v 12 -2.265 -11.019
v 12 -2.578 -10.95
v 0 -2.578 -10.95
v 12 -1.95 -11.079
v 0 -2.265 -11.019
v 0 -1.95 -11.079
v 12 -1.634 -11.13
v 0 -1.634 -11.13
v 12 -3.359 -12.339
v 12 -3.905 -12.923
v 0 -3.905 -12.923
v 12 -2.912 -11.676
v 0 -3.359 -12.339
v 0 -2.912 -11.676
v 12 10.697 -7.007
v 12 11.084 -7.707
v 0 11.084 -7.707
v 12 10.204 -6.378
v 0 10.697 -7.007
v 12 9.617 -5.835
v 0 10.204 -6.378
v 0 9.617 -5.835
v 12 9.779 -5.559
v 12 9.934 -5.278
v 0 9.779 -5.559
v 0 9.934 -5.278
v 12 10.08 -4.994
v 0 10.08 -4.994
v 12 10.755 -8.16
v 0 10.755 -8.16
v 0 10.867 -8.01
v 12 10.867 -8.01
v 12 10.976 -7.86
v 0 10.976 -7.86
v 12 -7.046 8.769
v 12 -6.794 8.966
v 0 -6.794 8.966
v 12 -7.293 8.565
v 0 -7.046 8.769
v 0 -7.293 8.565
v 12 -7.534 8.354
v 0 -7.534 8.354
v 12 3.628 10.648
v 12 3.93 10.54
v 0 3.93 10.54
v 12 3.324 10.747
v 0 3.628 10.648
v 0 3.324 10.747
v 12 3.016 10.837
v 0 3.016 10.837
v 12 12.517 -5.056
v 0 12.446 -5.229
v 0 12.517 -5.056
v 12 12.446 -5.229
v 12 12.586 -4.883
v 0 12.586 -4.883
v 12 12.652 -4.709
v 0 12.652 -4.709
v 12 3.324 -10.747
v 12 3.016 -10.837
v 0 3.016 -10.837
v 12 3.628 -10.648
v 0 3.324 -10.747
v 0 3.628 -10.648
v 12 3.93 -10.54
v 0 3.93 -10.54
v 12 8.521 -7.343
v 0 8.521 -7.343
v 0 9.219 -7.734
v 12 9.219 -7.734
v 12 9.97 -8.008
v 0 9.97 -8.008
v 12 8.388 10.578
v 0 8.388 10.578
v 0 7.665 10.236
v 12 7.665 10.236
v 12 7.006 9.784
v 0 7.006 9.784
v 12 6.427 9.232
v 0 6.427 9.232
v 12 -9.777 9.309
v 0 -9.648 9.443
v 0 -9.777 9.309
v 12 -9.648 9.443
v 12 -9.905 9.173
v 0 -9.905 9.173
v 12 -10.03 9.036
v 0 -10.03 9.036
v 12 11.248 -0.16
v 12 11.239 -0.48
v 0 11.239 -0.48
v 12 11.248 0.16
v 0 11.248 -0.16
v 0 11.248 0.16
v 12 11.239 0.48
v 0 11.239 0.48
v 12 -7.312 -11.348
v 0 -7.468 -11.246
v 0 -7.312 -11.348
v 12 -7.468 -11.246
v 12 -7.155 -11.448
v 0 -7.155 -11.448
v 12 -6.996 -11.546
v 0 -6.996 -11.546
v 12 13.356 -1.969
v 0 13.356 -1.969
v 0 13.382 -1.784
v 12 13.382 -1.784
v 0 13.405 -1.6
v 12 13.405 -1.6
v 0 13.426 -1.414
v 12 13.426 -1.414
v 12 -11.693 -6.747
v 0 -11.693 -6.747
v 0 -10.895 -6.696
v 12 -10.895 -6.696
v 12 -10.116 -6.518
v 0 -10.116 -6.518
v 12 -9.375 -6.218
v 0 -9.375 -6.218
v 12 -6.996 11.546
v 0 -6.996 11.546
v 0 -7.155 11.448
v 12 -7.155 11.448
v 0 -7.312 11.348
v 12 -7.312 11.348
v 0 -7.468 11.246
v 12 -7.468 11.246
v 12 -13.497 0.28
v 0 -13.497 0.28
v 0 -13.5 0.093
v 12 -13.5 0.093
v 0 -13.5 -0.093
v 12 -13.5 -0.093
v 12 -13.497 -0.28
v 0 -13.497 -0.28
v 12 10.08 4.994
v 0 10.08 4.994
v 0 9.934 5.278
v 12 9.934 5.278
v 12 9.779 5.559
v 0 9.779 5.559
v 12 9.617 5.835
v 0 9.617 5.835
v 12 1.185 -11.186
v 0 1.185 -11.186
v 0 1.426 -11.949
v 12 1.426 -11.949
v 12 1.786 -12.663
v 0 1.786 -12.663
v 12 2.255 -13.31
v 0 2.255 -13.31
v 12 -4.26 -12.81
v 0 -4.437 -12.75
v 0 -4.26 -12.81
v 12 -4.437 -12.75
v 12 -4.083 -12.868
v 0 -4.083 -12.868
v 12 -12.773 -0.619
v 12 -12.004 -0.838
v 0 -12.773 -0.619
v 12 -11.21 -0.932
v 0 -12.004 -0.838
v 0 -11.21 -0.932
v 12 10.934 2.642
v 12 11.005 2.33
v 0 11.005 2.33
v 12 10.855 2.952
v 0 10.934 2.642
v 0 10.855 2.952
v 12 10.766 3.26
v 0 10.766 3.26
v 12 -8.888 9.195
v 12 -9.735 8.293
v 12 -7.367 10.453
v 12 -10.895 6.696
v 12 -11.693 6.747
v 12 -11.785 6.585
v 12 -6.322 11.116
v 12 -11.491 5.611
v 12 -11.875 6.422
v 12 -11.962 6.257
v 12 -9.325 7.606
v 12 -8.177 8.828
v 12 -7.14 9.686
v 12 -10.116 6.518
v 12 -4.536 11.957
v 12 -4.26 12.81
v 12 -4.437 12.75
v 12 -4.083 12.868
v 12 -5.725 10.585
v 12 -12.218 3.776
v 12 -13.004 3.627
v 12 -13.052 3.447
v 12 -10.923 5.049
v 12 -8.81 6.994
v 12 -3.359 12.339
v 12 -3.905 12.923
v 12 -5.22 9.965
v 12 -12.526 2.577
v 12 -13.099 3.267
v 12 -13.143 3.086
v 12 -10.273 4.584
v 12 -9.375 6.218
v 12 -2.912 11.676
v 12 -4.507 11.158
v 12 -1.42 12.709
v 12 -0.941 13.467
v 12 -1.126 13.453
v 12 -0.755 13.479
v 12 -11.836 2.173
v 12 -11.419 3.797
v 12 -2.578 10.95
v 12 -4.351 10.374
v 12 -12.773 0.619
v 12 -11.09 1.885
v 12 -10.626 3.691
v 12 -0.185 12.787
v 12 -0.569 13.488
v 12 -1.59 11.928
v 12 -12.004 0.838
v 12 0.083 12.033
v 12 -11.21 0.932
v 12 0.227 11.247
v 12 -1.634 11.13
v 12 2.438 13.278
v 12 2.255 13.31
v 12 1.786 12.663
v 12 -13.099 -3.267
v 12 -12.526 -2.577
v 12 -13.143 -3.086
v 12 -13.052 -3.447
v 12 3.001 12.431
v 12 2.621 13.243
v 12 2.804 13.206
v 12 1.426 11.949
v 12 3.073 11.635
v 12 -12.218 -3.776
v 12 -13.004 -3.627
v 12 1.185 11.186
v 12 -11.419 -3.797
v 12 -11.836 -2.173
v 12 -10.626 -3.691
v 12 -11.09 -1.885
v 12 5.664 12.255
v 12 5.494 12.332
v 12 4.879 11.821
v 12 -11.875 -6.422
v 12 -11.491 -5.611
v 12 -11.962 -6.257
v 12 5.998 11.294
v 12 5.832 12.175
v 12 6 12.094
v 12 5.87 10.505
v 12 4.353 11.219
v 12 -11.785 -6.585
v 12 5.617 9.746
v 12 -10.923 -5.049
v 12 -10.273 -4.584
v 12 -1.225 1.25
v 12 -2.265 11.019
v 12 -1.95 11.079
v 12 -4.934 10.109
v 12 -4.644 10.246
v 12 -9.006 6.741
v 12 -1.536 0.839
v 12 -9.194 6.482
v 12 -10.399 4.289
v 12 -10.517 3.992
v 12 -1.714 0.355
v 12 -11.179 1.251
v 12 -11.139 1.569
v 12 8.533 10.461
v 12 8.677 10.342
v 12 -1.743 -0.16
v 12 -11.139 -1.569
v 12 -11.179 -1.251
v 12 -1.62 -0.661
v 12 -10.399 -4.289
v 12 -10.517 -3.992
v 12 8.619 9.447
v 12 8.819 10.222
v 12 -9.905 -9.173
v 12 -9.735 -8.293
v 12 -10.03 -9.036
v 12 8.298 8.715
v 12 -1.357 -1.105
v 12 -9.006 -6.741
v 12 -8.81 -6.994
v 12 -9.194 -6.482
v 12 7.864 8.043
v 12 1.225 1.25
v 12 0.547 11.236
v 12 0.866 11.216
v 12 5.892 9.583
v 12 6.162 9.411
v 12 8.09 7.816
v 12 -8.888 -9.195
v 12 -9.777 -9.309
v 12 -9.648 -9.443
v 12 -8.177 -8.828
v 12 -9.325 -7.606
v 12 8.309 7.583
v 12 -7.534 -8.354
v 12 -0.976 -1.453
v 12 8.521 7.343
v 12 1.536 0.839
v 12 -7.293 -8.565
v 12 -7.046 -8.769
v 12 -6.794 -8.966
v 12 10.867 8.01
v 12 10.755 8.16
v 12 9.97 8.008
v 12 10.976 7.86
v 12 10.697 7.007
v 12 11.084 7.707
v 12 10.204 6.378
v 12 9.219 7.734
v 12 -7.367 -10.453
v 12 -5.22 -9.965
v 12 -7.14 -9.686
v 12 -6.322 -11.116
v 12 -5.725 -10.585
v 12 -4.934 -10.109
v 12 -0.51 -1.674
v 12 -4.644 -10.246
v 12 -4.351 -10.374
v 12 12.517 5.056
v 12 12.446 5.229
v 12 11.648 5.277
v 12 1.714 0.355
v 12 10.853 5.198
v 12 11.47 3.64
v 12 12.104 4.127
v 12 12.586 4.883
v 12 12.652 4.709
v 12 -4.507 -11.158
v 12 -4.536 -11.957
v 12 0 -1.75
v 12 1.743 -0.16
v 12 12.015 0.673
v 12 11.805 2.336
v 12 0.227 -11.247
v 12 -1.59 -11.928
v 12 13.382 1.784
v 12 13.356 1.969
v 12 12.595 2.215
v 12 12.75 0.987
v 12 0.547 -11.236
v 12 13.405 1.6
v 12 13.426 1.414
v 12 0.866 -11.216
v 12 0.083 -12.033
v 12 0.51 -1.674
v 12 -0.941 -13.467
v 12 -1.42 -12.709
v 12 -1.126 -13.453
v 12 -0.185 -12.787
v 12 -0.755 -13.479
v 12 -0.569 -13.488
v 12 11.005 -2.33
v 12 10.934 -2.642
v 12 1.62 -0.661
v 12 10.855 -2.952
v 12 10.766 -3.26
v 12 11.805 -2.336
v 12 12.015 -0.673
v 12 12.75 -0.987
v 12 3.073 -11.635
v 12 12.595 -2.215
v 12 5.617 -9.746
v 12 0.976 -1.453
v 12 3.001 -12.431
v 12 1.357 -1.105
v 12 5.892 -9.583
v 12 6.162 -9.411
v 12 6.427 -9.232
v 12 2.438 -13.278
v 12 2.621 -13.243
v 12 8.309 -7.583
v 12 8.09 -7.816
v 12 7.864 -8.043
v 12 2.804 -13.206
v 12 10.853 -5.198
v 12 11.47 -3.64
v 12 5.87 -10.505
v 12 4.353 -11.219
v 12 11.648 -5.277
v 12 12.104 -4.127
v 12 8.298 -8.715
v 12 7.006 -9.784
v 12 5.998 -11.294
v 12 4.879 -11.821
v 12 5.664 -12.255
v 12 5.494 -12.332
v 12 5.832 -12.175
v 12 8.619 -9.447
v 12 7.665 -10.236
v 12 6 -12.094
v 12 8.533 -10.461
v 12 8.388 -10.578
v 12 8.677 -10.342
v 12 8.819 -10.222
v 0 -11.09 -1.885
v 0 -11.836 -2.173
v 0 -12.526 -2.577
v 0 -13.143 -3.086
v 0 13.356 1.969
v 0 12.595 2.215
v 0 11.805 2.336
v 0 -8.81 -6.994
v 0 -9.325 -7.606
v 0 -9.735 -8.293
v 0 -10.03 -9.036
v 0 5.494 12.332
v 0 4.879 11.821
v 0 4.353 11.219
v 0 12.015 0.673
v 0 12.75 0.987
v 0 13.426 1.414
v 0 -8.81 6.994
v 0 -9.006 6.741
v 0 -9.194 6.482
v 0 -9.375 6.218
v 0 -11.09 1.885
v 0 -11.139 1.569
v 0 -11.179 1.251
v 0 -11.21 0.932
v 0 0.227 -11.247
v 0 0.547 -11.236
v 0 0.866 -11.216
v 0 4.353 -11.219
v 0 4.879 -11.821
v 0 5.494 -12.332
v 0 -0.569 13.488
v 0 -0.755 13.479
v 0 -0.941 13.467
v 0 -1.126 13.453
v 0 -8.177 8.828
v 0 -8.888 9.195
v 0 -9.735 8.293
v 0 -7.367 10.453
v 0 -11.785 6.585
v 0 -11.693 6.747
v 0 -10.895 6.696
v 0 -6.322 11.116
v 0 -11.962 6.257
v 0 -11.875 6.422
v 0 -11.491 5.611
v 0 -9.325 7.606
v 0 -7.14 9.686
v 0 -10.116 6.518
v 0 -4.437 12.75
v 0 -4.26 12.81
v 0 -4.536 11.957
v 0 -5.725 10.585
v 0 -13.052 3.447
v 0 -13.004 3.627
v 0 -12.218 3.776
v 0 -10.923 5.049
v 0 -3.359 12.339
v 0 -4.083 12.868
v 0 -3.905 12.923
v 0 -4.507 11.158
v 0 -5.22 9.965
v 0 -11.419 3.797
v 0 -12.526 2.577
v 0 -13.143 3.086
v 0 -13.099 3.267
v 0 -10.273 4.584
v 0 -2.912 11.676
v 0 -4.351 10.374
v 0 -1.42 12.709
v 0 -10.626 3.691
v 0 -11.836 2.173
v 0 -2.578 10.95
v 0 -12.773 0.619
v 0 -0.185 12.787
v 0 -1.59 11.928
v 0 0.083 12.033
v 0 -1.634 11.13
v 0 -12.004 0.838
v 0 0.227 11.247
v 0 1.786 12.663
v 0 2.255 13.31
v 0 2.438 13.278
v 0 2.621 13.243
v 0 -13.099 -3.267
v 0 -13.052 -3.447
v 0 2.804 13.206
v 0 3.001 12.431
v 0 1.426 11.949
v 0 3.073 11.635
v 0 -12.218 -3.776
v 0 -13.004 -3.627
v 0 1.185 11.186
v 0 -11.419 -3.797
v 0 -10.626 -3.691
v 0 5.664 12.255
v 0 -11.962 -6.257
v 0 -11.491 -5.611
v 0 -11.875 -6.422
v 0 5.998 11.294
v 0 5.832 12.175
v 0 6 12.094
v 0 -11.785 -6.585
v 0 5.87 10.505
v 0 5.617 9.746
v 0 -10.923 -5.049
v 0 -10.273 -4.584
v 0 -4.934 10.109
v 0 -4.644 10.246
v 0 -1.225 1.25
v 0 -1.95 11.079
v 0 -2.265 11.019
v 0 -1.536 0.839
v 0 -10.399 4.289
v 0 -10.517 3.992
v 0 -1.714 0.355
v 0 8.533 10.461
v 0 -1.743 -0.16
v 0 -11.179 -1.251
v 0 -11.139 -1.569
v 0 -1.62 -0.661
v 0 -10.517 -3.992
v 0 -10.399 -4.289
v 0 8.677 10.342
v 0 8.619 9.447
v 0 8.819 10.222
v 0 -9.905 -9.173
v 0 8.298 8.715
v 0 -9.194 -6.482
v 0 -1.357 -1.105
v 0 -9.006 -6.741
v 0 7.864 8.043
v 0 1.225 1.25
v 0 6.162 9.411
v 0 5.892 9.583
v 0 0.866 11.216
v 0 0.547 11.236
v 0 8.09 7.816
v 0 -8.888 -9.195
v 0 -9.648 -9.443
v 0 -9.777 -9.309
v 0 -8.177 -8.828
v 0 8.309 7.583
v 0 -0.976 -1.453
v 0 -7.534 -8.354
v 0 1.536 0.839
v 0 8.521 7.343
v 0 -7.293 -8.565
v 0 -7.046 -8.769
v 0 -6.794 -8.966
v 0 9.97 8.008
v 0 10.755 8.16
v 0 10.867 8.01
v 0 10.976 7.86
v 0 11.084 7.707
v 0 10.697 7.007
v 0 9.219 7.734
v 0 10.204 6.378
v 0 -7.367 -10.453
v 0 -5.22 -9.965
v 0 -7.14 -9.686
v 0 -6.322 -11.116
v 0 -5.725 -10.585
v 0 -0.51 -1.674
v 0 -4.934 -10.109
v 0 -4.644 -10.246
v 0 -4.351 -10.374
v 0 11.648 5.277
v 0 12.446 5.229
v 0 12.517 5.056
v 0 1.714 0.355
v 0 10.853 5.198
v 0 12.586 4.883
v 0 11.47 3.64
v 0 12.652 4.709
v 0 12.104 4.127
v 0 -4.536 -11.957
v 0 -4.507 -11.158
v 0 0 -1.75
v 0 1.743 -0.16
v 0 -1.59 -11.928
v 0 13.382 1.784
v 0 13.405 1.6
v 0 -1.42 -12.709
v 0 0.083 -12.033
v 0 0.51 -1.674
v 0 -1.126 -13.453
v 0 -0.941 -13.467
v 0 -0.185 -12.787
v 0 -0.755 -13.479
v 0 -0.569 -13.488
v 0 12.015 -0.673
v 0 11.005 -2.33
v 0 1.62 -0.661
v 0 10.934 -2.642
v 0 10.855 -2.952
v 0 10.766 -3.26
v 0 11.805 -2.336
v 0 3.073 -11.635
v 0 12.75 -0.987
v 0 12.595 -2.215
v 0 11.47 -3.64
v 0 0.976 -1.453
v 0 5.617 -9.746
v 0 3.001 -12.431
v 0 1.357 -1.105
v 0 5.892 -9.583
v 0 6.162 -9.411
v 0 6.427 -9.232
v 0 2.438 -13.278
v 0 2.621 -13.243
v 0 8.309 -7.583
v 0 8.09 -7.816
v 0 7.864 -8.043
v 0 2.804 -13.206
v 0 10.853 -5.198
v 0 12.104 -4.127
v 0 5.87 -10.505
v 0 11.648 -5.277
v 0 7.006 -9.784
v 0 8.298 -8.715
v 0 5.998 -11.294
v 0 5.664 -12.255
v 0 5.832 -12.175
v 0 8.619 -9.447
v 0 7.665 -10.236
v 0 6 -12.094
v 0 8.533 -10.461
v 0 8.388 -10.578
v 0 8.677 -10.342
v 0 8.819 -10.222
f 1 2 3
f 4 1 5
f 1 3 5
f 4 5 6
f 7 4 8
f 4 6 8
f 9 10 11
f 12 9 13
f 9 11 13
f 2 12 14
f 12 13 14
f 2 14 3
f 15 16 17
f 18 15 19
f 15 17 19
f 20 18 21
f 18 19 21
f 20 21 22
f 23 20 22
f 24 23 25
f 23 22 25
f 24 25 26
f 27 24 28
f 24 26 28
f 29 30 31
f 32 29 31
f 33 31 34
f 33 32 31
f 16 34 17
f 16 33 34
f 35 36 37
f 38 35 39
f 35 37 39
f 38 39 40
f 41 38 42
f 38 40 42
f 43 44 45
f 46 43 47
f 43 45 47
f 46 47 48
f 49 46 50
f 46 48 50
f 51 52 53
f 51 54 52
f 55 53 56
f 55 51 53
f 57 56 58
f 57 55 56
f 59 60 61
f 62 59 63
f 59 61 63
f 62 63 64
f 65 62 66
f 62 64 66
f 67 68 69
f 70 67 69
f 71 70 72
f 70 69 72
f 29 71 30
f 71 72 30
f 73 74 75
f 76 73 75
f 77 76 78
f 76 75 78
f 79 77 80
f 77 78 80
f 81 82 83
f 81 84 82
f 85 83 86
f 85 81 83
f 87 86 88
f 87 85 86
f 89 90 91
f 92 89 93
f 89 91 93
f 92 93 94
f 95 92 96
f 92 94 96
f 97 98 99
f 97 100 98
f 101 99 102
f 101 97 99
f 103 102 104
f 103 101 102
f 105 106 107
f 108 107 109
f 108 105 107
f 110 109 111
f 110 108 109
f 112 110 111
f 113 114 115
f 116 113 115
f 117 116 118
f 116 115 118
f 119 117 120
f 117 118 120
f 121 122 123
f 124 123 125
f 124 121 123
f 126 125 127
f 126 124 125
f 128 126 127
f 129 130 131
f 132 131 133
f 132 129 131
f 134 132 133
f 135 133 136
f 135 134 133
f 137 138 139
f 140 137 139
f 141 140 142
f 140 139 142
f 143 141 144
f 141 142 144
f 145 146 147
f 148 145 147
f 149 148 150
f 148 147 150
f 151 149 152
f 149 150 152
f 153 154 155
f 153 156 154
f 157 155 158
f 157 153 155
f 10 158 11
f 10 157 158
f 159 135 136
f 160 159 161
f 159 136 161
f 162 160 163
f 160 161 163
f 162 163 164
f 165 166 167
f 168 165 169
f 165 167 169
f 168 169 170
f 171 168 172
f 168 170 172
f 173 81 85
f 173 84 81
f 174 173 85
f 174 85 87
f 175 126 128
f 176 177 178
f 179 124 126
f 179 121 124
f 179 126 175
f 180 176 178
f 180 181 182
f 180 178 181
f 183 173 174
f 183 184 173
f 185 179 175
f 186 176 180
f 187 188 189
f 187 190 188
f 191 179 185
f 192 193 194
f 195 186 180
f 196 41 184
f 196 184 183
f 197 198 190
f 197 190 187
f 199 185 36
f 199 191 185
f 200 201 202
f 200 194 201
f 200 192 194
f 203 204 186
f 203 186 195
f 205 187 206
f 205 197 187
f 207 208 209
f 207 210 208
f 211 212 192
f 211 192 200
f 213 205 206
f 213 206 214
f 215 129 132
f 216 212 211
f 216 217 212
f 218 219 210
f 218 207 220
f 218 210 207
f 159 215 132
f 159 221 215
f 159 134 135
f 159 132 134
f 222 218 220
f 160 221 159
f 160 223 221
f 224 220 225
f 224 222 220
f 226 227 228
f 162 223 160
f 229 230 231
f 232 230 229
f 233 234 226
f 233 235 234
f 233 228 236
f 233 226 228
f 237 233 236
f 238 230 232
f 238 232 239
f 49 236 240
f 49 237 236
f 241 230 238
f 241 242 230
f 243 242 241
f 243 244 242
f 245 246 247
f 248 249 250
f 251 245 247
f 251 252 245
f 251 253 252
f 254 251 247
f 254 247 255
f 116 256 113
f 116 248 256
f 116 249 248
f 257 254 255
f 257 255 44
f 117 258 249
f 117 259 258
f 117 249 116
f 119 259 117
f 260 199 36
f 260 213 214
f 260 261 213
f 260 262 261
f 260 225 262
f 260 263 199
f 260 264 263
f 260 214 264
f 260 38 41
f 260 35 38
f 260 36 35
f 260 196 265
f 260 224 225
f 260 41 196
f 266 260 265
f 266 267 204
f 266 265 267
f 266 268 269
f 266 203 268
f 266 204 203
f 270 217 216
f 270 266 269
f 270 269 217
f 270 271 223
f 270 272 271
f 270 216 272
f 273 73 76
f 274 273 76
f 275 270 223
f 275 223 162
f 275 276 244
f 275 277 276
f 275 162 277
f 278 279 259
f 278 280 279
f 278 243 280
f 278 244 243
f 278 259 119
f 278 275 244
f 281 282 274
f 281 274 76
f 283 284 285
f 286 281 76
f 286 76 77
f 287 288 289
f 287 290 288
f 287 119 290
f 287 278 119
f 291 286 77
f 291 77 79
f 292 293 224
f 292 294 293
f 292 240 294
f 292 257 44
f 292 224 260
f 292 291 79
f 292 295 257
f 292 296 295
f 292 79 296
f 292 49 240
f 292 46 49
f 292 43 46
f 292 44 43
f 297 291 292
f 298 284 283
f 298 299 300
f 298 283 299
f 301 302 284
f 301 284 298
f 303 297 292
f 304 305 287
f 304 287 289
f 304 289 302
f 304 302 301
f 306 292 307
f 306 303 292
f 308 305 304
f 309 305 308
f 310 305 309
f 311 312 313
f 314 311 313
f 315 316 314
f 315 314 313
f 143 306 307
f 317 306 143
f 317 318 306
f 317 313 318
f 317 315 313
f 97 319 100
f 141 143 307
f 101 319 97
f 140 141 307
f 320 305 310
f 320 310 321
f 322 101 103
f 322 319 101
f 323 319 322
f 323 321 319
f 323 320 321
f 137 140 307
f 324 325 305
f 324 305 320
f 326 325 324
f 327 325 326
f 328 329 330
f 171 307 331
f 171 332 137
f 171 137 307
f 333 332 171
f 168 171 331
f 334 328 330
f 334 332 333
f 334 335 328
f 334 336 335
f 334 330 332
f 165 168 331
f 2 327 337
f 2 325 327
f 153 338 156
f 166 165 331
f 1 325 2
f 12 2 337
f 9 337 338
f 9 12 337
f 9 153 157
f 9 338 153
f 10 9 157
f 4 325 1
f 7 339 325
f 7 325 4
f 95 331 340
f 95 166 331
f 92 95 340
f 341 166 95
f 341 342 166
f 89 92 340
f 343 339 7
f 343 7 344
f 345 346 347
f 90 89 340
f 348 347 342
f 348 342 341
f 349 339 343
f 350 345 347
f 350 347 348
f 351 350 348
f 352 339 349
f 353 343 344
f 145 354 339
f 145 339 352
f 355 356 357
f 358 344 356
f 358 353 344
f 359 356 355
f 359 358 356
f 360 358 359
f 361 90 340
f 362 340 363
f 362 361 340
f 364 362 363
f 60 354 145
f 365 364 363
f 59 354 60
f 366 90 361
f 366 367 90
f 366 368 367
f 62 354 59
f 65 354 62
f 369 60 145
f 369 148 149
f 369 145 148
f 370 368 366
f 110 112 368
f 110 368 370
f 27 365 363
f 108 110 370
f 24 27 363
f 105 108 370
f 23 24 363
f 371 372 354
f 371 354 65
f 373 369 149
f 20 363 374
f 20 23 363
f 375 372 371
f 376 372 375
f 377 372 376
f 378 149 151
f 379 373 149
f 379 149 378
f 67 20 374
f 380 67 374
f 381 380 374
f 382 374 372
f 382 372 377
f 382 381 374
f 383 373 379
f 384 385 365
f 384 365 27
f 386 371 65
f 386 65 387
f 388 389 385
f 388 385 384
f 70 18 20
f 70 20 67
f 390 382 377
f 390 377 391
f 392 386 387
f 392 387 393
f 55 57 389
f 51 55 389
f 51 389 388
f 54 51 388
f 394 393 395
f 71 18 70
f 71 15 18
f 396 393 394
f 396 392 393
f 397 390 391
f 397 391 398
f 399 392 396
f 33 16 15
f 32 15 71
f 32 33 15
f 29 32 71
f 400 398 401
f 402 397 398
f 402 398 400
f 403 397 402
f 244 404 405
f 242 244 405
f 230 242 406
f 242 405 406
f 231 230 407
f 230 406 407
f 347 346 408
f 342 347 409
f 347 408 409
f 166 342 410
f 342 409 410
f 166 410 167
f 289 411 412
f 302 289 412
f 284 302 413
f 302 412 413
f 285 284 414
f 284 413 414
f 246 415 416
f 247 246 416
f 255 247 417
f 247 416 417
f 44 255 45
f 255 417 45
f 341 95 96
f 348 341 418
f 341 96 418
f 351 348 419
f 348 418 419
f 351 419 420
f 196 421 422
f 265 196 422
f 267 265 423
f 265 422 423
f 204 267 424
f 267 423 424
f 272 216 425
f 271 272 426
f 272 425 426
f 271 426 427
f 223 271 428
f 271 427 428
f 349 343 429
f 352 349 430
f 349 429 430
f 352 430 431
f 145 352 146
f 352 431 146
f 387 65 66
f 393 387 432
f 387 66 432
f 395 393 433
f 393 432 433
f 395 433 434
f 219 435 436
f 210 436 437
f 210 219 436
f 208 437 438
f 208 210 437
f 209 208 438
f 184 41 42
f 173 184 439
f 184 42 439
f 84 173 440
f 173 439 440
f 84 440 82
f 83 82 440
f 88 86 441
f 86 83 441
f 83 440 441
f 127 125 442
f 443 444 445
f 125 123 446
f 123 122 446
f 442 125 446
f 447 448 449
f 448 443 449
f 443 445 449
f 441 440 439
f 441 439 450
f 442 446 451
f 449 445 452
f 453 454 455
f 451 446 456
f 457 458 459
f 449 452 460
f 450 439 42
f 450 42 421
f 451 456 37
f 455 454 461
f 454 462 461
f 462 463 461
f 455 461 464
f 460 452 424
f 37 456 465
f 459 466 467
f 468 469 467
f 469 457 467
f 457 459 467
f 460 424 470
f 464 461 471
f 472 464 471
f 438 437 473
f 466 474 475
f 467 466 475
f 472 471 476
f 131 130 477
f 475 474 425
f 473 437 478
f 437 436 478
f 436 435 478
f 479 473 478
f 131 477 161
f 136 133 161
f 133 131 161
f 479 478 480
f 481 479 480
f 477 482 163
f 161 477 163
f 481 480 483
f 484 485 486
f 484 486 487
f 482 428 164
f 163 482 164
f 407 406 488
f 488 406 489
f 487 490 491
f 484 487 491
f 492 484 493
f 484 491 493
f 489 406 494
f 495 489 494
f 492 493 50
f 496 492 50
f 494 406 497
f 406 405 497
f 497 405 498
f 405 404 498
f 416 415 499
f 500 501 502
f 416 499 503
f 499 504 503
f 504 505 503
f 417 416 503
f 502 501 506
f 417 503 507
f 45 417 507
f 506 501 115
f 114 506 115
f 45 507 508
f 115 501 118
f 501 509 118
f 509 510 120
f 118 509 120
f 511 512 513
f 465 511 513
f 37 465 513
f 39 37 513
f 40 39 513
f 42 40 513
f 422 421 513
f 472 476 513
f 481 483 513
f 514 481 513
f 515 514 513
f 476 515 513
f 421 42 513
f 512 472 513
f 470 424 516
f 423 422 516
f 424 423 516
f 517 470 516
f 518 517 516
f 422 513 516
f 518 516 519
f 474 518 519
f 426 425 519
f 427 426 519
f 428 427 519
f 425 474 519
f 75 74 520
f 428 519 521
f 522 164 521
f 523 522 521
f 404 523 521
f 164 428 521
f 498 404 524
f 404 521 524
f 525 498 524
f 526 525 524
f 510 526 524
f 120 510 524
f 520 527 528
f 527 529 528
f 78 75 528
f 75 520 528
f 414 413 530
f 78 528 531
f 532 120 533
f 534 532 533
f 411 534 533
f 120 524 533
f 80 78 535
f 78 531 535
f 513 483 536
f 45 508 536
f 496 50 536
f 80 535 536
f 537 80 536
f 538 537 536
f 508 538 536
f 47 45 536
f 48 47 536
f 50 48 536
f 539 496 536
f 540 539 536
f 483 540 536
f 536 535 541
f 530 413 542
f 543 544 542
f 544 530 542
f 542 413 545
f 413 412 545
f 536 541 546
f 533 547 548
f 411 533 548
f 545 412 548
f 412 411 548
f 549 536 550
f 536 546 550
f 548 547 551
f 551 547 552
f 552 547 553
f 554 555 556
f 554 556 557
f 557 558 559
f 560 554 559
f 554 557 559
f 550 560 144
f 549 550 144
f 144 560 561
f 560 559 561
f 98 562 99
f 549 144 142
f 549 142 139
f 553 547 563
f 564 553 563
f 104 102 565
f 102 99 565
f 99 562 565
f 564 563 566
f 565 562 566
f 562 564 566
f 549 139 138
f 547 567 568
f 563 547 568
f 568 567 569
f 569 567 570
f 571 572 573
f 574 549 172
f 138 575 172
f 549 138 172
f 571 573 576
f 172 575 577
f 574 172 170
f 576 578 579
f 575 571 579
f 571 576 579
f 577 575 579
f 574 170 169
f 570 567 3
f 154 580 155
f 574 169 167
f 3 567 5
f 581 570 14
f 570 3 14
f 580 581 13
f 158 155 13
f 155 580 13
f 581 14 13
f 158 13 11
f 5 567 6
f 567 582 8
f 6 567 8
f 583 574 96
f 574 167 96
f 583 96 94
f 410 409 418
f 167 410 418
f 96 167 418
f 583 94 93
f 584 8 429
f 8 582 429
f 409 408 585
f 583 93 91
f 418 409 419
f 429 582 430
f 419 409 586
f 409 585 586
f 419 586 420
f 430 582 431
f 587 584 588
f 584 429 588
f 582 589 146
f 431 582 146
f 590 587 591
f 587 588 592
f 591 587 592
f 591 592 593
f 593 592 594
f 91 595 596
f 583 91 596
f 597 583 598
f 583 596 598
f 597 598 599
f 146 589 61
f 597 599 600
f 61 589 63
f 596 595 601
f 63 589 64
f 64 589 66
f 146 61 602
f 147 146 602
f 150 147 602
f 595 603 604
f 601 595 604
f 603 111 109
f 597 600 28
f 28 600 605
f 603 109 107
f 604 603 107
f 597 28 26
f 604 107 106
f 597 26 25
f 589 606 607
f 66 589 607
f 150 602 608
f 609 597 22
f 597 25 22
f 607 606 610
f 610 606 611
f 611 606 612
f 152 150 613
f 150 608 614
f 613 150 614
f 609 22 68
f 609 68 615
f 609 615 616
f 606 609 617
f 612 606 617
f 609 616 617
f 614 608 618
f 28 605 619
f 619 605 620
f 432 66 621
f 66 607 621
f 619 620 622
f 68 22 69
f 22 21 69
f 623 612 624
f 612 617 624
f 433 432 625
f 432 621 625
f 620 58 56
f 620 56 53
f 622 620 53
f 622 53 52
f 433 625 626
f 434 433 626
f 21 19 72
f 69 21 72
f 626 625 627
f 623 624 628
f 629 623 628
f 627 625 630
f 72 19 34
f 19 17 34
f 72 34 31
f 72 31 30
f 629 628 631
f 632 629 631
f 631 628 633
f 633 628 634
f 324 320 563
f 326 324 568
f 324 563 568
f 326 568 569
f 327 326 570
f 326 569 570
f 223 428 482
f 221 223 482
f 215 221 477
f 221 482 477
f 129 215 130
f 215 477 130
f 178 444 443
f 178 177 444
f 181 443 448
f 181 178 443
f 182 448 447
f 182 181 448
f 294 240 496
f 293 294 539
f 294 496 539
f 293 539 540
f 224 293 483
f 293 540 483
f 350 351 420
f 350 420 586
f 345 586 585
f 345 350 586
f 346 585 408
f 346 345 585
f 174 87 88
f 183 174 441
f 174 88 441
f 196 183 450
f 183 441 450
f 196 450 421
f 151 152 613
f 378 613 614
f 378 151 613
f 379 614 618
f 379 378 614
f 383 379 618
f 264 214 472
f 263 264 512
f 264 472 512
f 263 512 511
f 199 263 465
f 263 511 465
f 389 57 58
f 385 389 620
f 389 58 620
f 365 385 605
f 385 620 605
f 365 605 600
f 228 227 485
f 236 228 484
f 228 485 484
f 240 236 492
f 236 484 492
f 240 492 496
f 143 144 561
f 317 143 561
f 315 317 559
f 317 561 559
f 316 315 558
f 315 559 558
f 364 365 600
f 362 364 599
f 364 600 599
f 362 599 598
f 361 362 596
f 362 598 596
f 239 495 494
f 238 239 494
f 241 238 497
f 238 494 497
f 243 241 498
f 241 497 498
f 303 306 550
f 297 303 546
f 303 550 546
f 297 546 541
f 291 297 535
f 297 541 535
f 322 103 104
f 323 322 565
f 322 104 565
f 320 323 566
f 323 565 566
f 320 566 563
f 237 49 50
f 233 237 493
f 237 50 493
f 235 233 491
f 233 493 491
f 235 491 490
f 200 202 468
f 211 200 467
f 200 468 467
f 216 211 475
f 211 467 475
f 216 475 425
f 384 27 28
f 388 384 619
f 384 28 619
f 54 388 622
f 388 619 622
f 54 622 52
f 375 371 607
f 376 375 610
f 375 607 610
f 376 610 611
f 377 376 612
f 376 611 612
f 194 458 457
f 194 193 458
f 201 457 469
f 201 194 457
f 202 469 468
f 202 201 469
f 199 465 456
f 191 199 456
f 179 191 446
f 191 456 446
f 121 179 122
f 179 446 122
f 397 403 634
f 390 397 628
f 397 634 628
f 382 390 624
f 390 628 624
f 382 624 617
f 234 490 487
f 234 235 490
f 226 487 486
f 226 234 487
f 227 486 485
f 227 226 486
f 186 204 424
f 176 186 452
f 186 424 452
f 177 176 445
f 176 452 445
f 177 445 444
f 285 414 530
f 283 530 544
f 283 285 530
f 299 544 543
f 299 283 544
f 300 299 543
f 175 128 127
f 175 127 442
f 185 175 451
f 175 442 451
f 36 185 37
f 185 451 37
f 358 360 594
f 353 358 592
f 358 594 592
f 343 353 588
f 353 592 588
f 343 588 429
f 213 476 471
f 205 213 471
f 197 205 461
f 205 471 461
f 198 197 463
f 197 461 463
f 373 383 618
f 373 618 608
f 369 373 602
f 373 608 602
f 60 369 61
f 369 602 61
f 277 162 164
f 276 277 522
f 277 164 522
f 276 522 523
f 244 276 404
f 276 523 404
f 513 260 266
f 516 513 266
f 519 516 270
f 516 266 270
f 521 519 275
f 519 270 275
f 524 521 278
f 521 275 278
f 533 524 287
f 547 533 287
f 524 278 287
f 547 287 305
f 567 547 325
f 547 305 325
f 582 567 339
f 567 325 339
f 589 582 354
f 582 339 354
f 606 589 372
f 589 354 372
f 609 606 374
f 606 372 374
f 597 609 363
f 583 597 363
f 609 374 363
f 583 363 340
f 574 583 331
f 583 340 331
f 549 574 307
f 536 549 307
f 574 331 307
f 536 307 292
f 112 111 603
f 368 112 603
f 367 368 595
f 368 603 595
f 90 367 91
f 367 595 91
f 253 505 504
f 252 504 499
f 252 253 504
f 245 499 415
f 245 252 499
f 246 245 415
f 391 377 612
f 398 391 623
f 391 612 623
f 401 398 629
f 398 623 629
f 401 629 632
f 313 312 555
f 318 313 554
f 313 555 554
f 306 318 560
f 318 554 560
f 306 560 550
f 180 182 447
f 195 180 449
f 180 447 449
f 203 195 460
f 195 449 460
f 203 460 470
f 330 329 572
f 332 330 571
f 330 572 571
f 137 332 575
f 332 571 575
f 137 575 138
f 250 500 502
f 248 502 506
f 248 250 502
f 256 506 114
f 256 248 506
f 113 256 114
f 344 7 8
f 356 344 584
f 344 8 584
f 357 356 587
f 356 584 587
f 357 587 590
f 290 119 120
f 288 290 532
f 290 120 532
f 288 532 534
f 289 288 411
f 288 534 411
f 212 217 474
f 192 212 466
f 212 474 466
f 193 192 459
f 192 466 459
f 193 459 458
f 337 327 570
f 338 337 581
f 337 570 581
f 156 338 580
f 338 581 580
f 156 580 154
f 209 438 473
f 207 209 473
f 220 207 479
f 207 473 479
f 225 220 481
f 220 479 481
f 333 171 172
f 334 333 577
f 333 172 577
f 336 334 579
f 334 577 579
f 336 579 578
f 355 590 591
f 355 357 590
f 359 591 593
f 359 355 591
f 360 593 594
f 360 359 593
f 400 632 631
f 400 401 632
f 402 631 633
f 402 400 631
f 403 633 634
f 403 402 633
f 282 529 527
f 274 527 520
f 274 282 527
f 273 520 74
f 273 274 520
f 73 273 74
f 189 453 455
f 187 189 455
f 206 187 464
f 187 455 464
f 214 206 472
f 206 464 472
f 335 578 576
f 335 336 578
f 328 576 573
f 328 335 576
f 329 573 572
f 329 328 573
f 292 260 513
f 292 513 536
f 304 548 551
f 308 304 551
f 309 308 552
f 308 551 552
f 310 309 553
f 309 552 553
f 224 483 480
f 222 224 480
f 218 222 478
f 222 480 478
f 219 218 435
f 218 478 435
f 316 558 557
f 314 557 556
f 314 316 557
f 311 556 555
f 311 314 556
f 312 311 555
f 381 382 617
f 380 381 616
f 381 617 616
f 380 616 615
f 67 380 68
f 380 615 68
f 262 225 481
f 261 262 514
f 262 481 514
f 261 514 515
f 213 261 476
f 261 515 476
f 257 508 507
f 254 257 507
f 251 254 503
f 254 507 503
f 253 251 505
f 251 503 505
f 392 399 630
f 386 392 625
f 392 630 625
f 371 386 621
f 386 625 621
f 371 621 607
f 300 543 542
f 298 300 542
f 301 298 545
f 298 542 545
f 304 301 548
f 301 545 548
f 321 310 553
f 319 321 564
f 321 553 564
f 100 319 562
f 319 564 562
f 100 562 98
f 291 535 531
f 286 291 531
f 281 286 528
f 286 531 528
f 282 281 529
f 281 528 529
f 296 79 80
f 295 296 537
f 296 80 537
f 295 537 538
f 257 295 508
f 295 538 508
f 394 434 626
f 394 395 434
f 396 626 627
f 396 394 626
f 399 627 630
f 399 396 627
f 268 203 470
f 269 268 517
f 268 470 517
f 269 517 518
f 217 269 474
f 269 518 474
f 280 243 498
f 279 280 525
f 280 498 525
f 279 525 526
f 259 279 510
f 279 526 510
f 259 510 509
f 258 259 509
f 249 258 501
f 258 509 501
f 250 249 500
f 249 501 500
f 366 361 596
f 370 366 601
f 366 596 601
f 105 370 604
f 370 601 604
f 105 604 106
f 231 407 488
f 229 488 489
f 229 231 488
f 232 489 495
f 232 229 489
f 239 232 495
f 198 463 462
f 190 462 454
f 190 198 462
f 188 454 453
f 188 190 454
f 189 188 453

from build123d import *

# Parameters (mm, degrees)
BASPROSKE_W         = 12
BASPROSKE_H         = 13.5
TOOTHCUT_DEPTH      = 23.549944568
TEETHCUTS_COUNT     = 25
TEETHCUTS_ANGLE     = 345.6
BORSKE_R            = 1.5
BORE_DEPTH          = 50.0000508
CUT_EXTRUDE1_DEPTH  = 23.542777009
BOSS_EXTRUDE2_DEPTH = 12


with BuildPart() as part:
    # BasProSke → Base-Revolve (revolve)
    with BuildSketch(Plane(origin=(0, 0, 0), x_dir=(1, 0, 0), z_dir=(0, 1, 0)), mode=Mode.PRIVATE) as base_revolve_sk:
        with Locations((6, 6.75)):
            Rectangle(BASPROSKE_W, BASPROSKE_H)
    revolve(base_revolve_sk.sketch.rotate(Axis((-10, 0, 0), (1, 0, 0)), 180), axis=Axis((-10, 0, 0), (1, 0, 0)))

    # TooCutSke → ToothCut (cut, through all)
    with BuildSketch(Plane(origin=(0, 0, 0), x_dir=(0, 0, -1), z_dir=(1, 0, 0))):
        with BuildLine():
            ThreePointArc((0.480087995, 11.238750665), (0, 11.249), (-0.480087995, 11.238750665))
            ThreePointArc((-0.480087995, 11.238750665), (-0.821124963, 12.40220054), (-1.432168974, 13.449361962))
            ThreePointArc((-1.432168974, 13.449361962), (0, 13.5254), (1.432168974, 13.449361962))
            ThreePointArc((1.432168974, 13.449361962), (0.821124963, 12.40220054), (0.480087995, 11.238750665))
        make_face()
    toothcut = extrude(amount=TOOTHCUT_DEPTH, mode=Mode.SUBTRACT)

    # TeethCuts: ToothCut ×25 about axis
    teethcuts_axis = Axis((-10, 0, 0), (1, 0, 0))
    for i in range(1, TEETHCUTS_COUNT):
        add(toothcut.rotate(teethcuts_axis, i * TEETHCUTS_ANGLE / (TEETHCUTS_COUNT - 1)), mode=Mode.SUBTRACT)

    # BorSke → Bore (cut, symmetric)
    with BuildSketch(Plane(origin=(0, 0, 0), x_dir=(0, 0, -1), z_dir=(1, 0, 0))):
        with Locations(Location((0, 0, 0), (0, 0, 180))):
            Circle(BORSKE_R)
    extrude(amount=BORE_DEPTH, both=True, mode=Mode.SUBTRACT)

    # Sketch1 → Cut-Extrude1 (cut, through all)
    with BuildSketch(Plane(origin=(12, 0, 0), x_dir=(0, 0, -1), z_dir=(1, 0, 0))):
        with BuildLine():
            Line((-1.25, 1.224744871), (-1.25, -1.224744871))
            ThreePointArc((-1.25, -1.224744871), (1.75, 0), (-1.25, 1.224744871))
        make_face()
    extrude(amount=-CUT_EXTRUDE1_DEPTH, mode=Mode.SUBTRACT)

    # Sketch1<4> → Boss-Extrude2 (add, through all)
    with BuildSketch(Plane(origin=(12, 0, 0), x_dir=(0, 0, -1), z_dir=(1, 0, 0))):
        with BuildLine():
            Line((-1.25, -0.829156198), (-1.25, 0.829156198))
            ThreePointArc((-1.25, 0.829156198), (-1.5, 0), (-1.25, -0.829156198))
        make_face()
    extrude(amount=-BOSS_EXTRUDE2_DEPTH)


solid = part.part
